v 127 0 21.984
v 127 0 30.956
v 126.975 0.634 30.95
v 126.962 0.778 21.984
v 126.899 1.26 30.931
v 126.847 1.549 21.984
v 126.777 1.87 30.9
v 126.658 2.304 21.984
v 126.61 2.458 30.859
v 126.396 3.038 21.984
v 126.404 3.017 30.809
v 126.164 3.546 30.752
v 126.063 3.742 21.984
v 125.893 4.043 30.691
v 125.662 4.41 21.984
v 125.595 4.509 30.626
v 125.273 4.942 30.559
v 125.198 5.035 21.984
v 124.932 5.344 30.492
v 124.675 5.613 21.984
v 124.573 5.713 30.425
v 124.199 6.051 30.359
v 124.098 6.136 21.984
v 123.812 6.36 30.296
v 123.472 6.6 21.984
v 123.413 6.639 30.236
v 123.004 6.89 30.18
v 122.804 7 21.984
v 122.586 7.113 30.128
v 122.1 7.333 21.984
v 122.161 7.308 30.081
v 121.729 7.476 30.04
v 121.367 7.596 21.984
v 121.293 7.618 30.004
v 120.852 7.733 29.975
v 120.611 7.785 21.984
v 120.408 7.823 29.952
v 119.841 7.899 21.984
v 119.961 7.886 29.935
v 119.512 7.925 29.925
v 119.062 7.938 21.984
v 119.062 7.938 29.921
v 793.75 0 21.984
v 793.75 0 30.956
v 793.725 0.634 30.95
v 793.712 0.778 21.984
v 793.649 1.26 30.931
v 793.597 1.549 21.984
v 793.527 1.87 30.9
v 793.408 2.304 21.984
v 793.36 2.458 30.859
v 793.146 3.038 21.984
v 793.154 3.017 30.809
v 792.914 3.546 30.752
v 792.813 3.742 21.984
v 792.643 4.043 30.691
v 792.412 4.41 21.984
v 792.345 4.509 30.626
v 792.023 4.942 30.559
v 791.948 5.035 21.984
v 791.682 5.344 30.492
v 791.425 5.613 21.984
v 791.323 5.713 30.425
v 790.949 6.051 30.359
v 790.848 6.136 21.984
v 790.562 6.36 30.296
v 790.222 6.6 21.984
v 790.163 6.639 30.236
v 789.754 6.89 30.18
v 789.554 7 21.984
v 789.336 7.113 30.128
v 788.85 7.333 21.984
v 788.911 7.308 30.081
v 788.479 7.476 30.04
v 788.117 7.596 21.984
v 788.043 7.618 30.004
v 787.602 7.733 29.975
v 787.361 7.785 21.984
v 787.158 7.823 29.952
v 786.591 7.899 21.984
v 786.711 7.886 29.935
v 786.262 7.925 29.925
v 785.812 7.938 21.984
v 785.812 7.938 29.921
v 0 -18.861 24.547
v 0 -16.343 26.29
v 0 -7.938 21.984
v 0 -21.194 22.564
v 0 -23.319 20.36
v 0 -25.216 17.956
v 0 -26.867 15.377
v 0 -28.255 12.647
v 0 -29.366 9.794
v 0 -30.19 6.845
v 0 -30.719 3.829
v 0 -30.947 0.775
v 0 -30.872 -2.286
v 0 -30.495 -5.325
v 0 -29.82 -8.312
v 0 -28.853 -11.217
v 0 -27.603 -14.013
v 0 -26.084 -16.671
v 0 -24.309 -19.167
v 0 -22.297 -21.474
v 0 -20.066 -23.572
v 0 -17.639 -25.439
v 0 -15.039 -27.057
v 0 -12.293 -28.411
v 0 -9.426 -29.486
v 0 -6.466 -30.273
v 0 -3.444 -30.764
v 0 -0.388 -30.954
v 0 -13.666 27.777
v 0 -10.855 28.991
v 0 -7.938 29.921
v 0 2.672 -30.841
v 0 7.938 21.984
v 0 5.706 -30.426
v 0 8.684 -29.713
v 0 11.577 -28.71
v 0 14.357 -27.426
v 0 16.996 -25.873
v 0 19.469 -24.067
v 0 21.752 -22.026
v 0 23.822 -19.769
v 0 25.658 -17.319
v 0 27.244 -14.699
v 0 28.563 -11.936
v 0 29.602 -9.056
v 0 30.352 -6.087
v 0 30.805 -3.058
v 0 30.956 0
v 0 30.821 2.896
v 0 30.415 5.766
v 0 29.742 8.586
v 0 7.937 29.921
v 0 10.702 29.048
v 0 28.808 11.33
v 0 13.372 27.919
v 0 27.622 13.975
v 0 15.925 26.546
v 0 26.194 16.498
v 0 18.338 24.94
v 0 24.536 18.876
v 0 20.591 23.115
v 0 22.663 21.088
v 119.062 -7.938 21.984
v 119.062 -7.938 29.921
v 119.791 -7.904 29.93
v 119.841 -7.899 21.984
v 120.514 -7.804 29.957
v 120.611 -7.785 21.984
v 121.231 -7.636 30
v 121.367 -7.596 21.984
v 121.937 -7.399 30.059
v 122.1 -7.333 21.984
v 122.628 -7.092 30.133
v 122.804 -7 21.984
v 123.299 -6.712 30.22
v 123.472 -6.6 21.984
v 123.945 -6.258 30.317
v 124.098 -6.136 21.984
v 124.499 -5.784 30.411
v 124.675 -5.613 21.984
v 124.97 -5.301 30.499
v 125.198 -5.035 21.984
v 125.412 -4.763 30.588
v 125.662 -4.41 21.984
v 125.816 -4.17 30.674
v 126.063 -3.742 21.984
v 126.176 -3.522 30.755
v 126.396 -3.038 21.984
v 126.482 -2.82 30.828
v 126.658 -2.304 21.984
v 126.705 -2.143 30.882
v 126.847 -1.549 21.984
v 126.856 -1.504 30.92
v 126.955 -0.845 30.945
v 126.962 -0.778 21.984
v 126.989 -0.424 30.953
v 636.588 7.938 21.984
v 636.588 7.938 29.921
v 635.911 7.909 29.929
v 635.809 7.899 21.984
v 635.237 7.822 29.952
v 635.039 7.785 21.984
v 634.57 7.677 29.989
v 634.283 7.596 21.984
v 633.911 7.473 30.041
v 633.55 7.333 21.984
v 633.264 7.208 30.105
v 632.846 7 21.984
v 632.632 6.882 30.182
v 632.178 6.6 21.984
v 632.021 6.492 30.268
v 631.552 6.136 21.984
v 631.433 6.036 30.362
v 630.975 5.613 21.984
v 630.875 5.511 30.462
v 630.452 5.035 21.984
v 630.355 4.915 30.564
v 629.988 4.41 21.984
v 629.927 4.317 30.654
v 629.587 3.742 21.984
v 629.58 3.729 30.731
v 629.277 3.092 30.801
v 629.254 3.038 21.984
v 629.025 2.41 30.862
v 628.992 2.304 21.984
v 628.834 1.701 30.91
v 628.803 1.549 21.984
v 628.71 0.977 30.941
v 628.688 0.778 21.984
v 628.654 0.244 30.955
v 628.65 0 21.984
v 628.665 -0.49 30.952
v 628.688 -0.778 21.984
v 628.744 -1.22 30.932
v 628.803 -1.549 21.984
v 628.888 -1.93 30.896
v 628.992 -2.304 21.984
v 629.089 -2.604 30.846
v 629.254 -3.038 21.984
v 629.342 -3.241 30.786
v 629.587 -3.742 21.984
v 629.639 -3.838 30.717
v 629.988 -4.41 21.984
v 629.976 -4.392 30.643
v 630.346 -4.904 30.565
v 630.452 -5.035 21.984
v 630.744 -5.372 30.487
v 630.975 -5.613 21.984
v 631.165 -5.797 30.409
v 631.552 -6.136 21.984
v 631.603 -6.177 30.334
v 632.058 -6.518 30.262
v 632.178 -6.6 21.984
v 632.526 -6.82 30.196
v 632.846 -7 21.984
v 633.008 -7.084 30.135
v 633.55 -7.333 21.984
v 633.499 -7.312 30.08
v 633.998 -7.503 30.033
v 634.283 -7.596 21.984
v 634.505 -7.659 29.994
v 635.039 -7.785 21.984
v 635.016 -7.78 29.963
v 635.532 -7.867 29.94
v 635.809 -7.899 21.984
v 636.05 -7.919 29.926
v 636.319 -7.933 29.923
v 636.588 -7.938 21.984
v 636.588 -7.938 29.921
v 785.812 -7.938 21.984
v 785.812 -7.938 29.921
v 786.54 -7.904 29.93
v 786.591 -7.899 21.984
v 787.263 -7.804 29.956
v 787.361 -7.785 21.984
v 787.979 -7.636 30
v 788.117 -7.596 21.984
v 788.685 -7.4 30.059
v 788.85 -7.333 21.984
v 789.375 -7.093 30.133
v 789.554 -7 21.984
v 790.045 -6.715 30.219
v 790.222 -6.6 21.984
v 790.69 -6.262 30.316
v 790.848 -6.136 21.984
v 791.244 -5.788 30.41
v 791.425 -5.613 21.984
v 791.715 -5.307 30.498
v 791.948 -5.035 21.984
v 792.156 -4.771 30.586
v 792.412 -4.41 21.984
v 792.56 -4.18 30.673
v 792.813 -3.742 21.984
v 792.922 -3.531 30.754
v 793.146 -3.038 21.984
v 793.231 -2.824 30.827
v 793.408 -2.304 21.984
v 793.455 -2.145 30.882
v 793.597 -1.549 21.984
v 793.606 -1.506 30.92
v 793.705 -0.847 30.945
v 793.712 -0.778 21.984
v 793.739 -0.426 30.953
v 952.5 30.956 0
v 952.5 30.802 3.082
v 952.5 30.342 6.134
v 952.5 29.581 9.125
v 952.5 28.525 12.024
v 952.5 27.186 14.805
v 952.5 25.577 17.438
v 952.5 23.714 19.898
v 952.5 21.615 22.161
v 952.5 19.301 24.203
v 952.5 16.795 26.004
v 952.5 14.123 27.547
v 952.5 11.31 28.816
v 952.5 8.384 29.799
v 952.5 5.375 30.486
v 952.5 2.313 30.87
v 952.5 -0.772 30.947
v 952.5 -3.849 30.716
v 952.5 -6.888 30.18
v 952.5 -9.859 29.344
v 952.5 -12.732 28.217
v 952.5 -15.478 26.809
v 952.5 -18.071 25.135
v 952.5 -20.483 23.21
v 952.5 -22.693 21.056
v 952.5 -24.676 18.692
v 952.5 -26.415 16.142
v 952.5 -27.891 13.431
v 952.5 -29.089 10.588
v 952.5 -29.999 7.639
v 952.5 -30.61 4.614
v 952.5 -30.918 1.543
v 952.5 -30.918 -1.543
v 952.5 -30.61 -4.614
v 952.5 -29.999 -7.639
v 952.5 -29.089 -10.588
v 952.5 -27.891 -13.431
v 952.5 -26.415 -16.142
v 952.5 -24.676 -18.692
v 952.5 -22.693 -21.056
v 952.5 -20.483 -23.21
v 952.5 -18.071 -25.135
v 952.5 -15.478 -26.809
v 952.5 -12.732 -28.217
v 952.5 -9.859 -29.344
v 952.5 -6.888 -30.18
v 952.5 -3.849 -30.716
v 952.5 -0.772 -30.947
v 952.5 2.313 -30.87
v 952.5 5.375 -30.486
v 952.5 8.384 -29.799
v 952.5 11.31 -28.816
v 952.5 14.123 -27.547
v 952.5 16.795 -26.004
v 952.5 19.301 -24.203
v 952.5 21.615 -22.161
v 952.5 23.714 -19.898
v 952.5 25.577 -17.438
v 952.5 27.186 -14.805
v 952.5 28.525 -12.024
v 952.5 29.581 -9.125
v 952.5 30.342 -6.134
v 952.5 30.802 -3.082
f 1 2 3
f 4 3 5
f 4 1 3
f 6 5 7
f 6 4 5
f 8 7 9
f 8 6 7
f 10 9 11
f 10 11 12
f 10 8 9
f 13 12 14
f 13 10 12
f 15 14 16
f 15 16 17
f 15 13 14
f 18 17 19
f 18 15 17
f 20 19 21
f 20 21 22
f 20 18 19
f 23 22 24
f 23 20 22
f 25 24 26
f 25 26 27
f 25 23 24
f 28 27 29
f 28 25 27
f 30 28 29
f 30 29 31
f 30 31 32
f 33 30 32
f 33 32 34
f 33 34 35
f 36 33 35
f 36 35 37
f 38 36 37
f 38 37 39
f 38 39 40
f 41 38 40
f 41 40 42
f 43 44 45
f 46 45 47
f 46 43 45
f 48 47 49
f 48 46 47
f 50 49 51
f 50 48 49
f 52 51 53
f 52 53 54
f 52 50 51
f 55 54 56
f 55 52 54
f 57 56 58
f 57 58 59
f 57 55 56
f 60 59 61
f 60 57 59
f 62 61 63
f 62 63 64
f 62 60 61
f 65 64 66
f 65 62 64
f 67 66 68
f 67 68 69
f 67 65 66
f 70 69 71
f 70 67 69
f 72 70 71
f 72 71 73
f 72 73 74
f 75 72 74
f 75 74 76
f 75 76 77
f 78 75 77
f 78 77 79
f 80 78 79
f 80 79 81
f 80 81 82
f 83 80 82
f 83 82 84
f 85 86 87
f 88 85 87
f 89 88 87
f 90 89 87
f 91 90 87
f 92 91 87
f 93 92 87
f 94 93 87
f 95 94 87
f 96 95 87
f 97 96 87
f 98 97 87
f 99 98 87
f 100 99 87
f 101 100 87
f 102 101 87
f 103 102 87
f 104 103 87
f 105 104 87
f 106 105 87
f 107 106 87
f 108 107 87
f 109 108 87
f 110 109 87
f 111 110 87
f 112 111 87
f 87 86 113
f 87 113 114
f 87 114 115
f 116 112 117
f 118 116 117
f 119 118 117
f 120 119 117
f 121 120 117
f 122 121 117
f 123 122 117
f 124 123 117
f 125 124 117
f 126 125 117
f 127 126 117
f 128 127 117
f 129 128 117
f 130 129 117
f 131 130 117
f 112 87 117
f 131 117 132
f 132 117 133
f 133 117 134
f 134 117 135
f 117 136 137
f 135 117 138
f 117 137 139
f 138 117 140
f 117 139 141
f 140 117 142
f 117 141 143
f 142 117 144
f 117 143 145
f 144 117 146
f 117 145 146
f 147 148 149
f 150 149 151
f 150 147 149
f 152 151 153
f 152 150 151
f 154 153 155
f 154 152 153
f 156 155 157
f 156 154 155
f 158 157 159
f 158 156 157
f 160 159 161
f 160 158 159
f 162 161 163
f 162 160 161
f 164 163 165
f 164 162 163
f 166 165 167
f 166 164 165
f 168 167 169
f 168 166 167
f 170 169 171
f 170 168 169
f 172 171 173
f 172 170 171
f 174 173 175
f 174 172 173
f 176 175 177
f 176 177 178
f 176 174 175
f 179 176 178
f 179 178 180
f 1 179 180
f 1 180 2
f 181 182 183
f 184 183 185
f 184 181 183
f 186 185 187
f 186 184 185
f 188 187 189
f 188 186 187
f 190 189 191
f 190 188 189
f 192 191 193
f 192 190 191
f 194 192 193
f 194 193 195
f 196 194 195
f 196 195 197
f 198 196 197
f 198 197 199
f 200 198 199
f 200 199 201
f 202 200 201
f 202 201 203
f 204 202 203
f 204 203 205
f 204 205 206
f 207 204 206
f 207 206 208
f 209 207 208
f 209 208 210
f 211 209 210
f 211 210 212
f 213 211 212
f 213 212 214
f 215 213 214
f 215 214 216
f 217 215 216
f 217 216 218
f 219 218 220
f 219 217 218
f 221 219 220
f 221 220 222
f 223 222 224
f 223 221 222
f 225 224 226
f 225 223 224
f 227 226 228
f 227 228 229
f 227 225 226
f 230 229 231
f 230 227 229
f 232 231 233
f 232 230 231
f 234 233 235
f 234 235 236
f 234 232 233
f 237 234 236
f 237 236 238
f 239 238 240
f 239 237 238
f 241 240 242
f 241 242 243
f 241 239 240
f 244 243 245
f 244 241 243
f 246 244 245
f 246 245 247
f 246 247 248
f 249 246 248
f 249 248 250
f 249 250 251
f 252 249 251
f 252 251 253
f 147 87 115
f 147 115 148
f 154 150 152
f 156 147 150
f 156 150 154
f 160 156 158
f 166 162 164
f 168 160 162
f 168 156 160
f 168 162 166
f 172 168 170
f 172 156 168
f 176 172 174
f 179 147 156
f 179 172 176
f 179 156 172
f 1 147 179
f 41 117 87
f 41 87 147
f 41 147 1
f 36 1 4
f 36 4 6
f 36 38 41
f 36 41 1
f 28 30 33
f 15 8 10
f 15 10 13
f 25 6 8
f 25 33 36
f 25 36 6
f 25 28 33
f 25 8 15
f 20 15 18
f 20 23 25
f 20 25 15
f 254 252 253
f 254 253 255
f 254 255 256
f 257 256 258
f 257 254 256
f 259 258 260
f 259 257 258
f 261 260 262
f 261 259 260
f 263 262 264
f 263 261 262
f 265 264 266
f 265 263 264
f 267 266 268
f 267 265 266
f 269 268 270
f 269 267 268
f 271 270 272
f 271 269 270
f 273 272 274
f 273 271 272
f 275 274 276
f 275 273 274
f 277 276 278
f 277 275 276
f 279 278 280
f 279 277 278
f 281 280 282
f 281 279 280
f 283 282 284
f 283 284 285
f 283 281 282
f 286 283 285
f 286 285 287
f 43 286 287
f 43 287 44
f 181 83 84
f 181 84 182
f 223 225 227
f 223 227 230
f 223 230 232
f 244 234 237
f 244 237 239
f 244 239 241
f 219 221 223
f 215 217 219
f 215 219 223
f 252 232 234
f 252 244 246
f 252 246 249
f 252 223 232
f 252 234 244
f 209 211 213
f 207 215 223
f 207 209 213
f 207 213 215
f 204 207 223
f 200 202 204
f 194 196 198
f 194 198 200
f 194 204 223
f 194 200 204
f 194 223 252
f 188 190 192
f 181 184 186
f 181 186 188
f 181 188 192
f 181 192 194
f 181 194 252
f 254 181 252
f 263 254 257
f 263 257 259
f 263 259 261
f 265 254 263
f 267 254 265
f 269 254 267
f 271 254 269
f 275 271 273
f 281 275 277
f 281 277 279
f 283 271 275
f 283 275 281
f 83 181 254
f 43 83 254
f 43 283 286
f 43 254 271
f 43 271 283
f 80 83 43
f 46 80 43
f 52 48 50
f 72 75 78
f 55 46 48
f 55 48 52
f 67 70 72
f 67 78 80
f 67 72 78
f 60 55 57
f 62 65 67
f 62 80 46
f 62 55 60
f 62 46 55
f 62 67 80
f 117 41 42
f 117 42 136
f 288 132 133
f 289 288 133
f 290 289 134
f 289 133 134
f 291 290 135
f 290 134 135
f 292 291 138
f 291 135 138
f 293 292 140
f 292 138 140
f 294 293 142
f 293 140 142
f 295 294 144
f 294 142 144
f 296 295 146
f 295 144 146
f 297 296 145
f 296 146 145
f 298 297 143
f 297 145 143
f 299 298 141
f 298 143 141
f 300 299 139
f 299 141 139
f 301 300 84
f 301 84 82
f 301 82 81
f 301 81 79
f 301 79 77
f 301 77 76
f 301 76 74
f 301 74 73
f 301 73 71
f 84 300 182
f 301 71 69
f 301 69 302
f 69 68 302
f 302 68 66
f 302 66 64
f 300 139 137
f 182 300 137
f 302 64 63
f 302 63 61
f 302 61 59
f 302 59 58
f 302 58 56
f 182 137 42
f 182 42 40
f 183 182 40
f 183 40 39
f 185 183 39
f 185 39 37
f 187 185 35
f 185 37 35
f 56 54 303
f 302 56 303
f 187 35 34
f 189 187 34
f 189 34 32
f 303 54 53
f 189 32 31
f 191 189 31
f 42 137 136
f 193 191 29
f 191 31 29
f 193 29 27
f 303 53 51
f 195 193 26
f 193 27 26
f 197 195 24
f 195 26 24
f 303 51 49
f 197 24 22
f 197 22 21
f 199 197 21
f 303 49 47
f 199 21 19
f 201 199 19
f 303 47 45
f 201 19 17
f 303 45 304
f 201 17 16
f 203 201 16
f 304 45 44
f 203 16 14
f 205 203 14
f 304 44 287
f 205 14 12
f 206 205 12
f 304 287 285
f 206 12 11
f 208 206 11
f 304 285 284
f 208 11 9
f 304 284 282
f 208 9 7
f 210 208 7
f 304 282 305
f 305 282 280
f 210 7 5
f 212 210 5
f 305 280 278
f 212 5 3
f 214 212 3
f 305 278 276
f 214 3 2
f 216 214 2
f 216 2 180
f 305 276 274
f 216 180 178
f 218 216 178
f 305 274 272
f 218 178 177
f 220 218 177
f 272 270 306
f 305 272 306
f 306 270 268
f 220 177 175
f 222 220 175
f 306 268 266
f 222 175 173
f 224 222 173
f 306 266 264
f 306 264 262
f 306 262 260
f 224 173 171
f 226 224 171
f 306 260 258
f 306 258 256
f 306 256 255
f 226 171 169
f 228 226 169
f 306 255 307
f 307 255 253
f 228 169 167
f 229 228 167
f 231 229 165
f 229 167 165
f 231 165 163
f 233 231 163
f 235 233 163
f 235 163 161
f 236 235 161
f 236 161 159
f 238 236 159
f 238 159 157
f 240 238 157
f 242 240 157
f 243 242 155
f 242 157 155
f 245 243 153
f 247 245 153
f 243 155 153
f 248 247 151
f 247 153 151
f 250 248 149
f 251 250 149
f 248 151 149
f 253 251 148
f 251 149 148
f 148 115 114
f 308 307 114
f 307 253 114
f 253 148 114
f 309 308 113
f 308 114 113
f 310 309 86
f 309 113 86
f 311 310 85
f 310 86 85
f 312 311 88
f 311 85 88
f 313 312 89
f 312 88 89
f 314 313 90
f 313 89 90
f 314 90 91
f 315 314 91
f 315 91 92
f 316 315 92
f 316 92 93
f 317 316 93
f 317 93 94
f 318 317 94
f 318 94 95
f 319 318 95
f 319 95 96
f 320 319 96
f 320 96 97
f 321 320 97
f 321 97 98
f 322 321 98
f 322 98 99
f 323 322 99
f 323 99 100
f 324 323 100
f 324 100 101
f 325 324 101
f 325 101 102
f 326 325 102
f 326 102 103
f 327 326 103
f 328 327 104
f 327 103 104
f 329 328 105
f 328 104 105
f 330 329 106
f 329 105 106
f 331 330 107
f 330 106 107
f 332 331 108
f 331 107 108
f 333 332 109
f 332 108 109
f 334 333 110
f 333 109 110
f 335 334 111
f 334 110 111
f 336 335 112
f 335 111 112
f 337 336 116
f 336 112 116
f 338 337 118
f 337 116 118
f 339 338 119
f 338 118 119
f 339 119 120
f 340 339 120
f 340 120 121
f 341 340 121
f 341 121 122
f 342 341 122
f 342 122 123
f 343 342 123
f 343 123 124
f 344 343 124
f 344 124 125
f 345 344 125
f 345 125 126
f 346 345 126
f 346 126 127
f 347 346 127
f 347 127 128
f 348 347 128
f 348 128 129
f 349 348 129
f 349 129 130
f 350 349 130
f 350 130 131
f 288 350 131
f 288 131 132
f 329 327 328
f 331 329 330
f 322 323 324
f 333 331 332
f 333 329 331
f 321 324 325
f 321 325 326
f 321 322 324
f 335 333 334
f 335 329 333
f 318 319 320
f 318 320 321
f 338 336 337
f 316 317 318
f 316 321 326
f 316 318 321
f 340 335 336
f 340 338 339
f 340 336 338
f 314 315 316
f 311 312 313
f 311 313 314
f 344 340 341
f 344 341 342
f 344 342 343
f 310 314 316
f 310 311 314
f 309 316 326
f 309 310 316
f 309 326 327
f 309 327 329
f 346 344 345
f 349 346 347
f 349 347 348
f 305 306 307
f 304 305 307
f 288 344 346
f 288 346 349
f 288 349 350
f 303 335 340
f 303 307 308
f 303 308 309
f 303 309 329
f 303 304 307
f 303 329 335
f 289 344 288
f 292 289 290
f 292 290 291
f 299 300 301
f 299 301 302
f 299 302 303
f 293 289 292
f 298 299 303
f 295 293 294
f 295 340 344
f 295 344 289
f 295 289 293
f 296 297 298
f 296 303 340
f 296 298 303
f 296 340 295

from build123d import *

# Parameters (mm, degrees)
F0_R     = 30.95625
F1_DEPTH = 952.5
F6_DEPTH = 9.9724281426


with BuildPart() as f1:
    # F0 (on Right) → F1 (new body)
    with BuildSketch(Plane.YZ):
        Circle(F0_R)
    extrude(amount=F1_DEPTH)

    # F5 (on plane+point) → F6 (cut, up to face)
    with BuildSketch(Plane.XY.offset(21.9838219596)):
        with BuildLine():
            Line((0, 7.9375), (0, 0))
            Line((0, 0), (0, -7.9375))
            Line((0, -7.9375), (119.0625, -7.9375))
            ThreePointArc((119.0625, -7.9375), (111.125, 0), (119.0625, 7.9375))
            Line((119.0625, 7.9375), (0, 7.9375))
        make_face()
        with BuildLine():
            ThreePointArc((119.0625, 7.9375), (111.125, 0), (119.0625, -7.9375))
            ThreePointArc((119.0625, -7.9375), (124.6751600757, -5.6126600757), (127, 0))
            ThreePointArc((127, 0), (124.6751600757, 5.6126600757), (119.0625, 7.9375))
        make_face()
        with BuildLine():
            ThreePointArc((636.5875, -7.9375), (642.2001600757, -5.6126600757), (644.525, 0))
            ThreePointArc((644.525, 0), (642.2001600757, 5.6126600757), (636.5875, 7.9375))
            ThreePointArc((636.5875, 7.9375), (628.65, 0), (636.5875, -7.9375))
        make_face()
        with BuildLine():
            ThreePointArc((636.5875, 7.9375), (642.2001600757, 5.6126600757), (644.525, 0))
            ThreePointArc((644.525, 0), (642.2001600757, -5.6126600757), (636.5875, -7.9375))
            Line((636.5875, -7.9375), (785.8125, -7.9375))
            ThreePointArc((785.8125, -7.9375), (777.875, 0), (785.8125, 7.9375))
            Line((785.8125, 7.9375), (636.5875, 7.9375))
        make_face()
        with BuildLine():
            ThreePointArc((793.75, 0), (791.4251600757, 5.6126600757), (785.8125, 7.9375))
            ThreePointArc((785.8125, 7.9375), (777.875, 0), (785.8125, -7.9375))
            ThreePointArc((785.8125, -7.9375), (791.4251600757, -5.6126600757), (793.75, 0))
        make_face()
    extrude(amount=F6_DEPTH, mode=Mode.SUBTRACT)


solid = f1.part
